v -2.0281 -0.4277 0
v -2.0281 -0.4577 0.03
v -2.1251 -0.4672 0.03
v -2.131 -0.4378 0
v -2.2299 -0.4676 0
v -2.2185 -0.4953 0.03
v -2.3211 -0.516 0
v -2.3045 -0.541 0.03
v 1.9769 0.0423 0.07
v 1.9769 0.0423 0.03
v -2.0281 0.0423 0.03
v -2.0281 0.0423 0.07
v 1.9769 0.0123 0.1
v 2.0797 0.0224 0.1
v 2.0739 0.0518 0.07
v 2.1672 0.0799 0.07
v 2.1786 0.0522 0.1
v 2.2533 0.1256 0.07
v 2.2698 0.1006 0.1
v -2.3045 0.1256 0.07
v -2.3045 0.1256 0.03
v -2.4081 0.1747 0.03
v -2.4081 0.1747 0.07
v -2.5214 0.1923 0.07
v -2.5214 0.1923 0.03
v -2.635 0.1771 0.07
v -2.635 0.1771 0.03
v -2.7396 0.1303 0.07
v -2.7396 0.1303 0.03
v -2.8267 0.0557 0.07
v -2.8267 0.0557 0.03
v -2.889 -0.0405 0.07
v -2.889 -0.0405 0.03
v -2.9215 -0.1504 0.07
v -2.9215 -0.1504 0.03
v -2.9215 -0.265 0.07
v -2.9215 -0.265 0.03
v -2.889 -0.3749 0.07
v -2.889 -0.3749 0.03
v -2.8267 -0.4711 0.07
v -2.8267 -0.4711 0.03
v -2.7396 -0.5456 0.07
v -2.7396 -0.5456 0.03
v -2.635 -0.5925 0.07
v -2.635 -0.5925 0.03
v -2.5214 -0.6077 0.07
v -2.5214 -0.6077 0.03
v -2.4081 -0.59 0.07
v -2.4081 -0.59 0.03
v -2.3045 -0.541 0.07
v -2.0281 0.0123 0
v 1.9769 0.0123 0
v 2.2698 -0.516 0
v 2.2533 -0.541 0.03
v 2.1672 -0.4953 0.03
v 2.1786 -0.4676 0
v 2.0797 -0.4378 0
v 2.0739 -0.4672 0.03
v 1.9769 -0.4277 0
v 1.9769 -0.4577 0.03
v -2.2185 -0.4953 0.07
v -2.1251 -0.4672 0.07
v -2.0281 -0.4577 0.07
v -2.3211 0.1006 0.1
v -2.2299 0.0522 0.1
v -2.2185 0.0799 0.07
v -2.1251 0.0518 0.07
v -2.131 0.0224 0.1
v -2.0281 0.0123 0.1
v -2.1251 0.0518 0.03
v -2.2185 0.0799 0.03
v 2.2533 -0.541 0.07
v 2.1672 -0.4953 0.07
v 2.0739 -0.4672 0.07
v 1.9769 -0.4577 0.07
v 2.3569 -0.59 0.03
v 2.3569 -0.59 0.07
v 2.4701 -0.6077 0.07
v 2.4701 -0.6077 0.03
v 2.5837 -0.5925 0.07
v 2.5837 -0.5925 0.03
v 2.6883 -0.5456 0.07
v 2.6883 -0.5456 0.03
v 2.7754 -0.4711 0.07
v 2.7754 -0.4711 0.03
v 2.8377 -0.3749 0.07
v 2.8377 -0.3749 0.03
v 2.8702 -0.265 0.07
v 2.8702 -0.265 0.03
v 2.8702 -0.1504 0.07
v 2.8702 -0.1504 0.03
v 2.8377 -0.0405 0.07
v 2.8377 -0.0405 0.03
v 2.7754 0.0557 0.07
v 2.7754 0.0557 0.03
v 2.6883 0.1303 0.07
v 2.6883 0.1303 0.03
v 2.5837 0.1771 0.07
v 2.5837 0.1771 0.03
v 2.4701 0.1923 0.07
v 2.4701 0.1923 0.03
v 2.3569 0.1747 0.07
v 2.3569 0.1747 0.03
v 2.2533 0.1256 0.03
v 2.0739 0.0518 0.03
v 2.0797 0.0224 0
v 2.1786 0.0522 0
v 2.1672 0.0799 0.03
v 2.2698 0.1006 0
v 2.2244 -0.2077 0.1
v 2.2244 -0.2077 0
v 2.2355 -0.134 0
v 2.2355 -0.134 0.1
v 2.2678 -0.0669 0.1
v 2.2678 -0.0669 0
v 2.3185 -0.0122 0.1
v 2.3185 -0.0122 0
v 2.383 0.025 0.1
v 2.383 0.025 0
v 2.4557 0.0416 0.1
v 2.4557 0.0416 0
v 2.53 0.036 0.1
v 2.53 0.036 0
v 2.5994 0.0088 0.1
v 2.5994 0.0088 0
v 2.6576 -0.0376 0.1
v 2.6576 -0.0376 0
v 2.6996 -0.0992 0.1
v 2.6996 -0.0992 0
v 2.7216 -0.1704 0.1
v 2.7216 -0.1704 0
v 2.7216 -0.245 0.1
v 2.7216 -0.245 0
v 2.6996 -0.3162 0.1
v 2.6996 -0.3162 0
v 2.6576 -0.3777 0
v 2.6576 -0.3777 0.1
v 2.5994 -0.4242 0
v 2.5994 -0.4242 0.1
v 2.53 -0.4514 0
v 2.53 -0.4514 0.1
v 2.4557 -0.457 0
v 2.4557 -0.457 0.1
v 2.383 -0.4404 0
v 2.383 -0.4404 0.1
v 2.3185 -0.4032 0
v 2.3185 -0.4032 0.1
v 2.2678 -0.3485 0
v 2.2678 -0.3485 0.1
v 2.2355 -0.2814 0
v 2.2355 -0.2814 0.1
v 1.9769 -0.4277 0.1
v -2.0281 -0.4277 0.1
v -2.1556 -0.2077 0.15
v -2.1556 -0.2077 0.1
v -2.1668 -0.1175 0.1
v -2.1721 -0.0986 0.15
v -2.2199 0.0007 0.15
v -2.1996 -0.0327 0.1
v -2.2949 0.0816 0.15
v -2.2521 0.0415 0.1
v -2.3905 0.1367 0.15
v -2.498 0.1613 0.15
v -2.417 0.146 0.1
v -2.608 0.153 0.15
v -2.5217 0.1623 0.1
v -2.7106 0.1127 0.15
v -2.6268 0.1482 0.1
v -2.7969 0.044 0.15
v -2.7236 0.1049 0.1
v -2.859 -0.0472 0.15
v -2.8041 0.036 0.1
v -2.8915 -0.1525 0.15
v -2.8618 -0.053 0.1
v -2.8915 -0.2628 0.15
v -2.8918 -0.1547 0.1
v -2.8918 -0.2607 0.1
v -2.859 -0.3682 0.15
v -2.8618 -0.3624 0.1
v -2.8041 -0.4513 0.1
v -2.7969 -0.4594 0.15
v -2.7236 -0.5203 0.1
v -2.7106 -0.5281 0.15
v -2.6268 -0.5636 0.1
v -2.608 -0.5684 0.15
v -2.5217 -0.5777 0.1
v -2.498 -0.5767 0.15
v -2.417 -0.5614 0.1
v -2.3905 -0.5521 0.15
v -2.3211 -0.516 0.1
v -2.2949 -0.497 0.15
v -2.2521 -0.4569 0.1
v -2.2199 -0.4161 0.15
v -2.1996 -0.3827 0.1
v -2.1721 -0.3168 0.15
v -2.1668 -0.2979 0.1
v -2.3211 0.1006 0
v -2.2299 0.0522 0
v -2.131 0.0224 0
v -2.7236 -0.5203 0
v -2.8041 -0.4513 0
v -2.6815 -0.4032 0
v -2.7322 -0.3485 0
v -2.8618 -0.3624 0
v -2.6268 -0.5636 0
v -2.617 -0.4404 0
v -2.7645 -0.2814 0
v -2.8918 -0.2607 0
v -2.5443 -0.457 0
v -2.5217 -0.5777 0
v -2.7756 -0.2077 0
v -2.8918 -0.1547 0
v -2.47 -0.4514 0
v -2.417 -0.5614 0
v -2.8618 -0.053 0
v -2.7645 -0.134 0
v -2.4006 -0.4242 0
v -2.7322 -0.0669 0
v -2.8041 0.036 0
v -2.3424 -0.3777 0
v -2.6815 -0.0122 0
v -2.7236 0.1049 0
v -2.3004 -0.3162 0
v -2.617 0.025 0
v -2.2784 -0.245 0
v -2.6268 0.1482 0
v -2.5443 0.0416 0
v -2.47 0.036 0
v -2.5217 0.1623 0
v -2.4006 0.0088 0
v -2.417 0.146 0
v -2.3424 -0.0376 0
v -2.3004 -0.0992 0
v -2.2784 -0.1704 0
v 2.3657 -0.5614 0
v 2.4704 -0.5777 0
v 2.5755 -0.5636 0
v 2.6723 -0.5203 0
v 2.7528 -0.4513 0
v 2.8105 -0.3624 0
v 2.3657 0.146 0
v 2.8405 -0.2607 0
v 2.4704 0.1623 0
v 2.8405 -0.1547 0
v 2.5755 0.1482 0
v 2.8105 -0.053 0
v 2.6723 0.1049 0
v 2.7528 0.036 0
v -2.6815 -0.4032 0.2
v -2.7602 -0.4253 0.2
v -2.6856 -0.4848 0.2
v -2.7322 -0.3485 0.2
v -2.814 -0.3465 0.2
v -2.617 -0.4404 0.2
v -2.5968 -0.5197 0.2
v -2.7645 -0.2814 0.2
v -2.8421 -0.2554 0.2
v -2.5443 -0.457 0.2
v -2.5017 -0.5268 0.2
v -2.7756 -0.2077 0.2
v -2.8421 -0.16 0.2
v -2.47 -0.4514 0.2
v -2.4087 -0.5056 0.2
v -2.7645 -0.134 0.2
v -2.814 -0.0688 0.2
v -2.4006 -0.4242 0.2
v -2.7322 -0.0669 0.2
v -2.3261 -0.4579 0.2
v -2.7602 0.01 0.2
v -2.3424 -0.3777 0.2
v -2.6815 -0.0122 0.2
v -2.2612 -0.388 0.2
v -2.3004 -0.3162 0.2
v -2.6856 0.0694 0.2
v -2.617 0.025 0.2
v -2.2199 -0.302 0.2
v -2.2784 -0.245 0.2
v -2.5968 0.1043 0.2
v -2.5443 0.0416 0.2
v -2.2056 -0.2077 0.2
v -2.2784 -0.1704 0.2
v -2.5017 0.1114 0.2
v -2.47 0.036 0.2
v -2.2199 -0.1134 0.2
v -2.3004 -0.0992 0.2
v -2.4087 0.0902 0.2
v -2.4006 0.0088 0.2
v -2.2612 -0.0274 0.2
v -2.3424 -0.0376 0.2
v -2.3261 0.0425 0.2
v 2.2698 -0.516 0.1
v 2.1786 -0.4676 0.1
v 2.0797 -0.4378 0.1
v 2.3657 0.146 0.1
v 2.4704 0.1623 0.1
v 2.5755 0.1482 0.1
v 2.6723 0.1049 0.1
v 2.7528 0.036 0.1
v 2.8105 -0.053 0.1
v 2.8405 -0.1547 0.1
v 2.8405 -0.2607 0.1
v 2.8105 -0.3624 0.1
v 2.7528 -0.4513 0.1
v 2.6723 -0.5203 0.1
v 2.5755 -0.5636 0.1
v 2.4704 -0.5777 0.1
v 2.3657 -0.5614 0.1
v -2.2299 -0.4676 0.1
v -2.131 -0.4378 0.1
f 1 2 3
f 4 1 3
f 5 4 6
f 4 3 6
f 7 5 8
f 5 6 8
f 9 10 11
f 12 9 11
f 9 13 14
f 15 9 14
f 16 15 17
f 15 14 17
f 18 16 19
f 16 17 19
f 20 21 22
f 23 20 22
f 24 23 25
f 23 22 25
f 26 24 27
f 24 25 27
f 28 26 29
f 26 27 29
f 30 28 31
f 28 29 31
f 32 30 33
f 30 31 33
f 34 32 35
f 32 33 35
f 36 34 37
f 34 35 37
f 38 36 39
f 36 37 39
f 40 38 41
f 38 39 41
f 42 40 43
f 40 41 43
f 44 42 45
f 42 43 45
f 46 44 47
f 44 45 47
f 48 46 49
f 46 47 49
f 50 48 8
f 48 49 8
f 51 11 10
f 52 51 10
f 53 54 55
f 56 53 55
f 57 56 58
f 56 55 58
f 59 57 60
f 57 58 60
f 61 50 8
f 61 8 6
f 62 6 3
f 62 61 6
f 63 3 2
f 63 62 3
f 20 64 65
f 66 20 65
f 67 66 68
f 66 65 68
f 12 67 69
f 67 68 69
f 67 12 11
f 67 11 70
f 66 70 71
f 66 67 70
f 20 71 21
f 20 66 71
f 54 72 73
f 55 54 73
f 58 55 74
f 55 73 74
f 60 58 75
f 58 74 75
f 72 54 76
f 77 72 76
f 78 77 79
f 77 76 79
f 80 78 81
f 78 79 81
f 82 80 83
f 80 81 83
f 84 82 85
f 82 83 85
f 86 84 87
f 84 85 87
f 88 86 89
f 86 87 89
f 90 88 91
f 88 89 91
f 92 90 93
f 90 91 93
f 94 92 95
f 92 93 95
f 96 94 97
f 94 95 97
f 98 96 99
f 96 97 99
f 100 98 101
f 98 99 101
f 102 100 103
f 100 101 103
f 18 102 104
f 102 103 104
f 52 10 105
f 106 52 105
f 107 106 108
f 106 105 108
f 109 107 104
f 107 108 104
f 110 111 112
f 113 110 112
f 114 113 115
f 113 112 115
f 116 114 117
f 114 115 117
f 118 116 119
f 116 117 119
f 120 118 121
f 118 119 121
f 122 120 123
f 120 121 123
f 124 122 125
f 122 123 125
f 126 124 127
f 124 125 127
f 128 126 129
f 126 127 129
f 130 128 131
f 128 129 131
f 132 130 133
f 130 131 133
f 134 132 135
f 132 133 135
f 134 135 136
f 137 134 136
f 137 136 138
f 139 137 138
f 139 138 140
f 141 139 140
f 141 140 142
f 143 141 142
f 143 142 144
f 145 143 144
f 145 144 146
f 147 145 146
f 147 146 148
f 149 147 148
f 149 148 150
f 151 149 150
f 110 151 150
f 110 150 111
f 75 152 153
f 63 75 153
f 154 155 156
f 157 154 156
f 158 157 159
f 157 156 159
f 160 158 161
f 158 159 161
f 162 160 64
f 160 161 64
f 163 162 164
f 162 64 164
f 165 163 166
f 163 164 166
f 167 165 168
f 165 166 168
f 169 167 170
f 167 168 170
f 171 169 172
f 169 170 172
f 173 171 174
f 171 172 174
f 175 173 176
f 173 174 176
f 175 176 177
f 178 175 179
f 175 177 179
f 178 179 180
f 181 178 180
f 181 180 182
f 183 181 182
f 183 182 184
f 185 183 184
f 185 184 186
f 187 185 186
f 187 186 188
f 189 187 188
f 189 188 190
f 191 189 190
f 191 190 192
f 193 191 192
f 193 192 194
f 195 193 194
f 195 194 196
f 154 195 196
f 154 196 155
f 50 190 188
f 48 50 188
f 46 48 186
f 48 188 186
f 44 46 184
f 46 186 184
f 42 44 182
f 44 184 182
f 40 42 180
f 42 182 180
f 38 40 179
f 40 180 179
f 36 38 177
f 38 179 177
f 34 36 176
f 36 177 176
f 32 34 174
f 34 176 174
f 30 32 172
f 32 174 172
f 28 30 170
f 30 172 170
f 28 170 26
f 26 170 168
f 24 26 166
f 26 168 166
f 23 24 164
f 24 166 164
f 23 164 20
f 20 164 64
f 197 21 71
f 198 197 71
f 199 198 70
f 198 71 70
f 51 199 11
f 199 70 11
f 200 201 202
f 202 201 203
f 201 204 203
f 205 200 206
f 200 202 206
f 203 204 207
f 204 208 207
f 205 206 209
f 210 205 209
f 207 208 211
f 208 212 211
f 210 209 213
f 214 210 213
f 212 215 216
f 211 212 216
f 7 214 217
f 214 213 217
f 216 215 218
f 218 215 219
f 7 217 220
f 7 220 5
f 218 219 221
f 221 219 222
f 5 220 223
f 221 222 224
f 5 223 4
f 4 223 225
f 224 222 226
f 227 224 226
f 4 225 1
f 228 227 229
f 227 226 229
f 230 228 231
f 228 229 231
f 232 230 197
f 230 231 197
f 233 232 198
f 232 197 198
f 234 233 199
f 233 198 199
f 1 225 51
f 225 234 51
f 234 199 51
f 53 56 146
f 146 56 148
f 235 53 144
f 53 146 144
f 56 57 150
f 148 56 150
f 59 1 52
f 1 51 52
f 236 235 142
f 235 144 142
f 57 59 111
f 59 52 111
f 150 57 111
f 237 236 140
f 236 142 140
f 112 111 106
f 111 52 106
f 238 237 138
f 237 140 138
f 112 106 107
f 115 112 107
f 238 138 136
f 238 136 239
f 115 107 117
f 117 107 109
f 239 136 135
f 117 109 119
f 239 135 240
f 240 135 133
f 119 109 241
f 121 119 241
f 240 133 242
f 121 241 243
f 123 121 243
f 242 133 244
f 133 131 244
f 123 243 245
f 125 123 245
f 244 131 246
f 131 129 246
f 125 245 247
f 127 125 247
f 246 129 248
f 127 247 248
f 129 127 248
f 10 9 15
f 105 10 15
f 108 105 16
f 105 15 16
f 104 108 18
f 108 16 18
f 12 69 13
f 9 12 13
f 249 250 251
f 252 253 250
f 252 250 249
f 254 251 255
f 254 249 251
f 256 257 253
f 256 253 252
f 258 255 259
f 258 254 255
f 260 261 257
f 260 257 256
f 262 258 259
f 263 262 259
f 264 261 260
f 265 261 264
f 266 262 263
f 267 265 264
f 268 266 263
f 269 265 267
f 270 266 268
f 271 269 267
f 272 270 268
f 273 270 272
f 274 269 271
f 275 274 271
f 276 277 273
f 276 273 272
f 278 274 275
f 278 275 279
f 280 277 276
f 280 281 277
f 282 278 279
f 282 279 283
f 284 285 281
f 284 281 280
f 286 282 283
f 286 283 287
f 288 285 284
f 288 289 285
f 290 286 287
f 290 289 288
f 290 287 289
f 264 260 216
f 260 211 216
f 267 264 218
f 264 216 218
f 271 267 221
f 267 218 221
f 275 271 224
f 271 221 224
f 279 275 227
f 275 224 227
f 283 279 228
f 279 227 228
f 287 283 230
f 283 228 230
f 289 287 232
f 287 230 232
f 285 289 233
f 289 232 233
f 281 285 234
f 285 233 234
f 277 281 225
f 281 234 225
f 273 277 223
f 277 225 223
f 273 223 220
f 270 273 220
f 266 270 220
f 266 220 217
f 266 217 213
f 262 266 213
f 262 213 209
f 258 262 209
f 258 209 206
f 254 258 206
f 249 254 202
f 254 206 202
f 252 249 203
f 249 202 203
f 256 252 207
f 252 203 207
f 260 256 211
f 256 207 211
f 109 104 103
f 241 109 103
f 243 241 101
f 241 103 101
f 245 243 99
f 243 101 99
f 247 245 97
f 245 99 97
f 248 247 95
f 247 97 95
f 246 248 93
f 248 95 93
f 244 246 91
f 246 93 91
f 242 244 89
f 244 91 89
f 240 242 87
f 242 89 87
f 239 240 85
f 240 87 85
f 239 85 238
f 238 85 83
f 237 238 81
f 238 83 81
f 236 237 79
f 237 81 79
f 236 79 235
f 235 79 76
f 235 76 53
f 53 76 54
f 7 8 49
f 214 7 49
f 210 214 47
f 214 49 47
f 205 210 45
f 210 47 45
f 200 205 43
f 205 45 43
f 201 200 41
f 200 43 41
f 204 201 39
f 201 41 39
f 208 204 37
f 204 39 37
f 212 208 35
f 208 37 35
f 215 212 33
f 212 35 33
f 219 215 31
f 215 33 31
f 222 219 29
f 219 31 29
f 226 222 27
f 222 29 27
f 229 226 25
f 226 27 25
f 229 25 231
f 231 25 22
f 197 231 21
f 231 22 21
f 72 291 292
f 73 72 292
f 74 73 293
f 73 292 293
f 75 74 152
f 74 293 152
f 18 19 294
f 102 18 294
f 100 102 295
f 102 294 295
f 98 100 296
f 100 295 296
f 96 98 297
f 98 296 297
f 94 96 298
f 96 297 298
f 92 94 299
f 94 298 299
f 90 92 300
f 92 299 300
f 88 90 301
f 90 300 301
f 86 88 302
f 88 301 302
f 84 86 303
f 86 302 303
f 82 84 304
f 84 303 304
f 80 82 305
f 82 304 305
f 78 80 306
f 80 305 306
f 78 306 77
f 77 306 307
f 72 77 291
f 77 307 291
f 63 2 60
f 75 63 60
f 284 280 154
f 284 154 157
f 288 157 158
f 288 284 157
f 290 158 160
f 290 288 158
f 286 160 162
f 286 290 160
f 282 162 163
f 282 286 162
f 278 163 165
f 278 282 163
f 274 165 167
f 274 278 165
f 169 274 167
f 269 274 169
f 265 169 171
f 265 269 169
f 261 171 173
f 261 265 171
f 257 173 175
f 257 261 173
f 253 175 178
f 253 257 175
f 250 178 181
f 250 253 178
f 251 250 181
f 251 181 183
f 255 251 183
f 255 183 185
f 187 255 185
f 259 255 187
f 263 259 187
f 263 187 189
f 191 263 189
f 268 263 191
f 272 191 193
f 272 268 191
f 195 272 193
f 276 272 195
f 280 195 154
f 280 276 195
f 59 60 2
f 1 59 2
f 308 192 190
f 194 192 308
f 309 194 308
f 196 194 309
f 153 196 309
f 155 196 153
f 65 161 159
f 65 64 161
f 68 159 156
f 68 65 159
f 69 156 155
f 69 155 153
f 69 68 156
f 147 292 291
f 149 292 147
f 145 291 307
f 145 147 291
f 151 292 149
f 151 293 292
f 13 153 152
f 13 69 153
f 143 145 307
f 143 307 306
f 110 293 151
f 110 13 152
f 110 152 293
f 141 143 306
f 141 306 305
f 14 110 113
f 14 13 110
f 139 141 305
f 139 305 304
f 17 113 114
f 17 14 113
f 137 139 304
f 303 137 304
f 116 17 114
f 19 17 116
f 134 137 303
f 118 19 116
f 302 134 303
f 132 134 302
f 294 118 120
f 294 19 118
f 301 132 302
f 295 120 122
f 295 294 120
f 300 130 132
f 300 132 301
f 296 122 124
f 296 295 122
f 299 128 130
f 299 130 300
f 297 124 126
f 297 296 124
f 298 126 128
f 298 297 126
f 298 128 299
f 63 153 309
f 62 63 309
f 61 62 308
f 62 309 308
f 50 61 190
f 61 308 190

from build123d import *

# Parameters (mm, degrees)
BOSS_EXTRUDE1_DEPTH     = 0.1
FILLET1_R               = 0.5
FILLET2_R               = 0.5
CHAMFER2_SIZE           = 0.03
CHAMFER3_SIZE           = 0.03
SKETCH3_R               = 0.25
CUT_EXTRUDE1_DEPTH      = 1
CUT_EXTRUDE1_DEPTH_BACK = 1.1
SKETCH5_R               = 0.37
BOSS_EXTRUDE2_DEPTH     = 0.1
SKETCH7_R               = 0.25
CUT_EXTRUDE2_DEPTH      = 0.1
CHAMFER4_SIZE           = 0.05


with BuildPart() as part:
    # Sketch2 → Boss-Extrude1 (new body)
    with BuildSketch(Plane.XY):
        with BuildLine():
            Line((2.162109074, 0.042307692), (-2.213391126, 0.042307692))
            ThreePointArc((-2.213391126, 0.042307692), (-2.925641026, -0.207692308), (-2.213391126, -0.457692308))
            Line((-2.213391126, -0.457692308), (2.162109074, -0.457692308))
            ThreePointArc((2.162109074, -0.457692308), (2.874358974, -0.207692308), (2.162109074, 0.042307692))
        make_face()
    extrude(amount=BOSS_EXTRUDE1_DEPTH)

    # Fillet1
    fillet1_edges = [part.edges().sort_by_distance(p)[0] for p in [
        (2.162109074, 0.042307692, 0.05),
    ]]
    fillet(fillet1_edges, radius=FILLET1_R)

    # Fillet2
    fillet2_edges = [part.edges().sort_by_distance(p)[0] for p in [
        (2.162109074, -0.457692308, 0.05),
        (-2.213391126, -0.457692308, 0.05),
        (-2.213391126, 0.042307692, 0.05),
    ]]
    fillet(fillet2_edges, radius=FILLET2_R)

    # Chamfer2
    chamfer2_edges = [part.edges().sort_by_distance(p)[0] for p in [
        (2.121202823, 0.063594138, 0.1),
        (-2.925641026, -0.207692308, 0.1),
        (-0.025641026, 0.042307692, 0.1),
        (-0.025641026, -0.457692308, 0.1),
        (2.874358974, -0.207692308, 0.1),
        (-2.172484874, 0.063594138, 0.1),
        (-2.172484874, -0.478978754, 0.1),
        (2.121202823, -0.478978754, 0.1),
    ]]
    chamfer(chamfer2_edges, length=CHAMFER2_SIZE)

    # Chamfer3
    chamfer3_edges = [part.edges().sort_by_distance(p)[0] for p in [
        (2.121202823, 0.063594138, 0),
        (-2.925641026, -0.207692308, 0),
        (-0.025641026, 0.042307692, 0),
        (-0.025641026, -0.457692308, 0),
        (2.874358974, -0.207692308, 0),
        (-2.172484874, 0.063594138, 0),
        (-2.172484874, -0.478978754, 0),
        (2.121202823, -0.478978754, 0),
    ]]
    chamfer(chamfer3_edges, length=CHAMFER3_SIZE)

    # Sketch3 → Cut-Extrude1 (cut, two sides)
    with BuildSketch(Plane(origin=(0, 0, 0), x_dir=(-1, 0, 0), z_dir=(0, 0, -1))) as cut_extrude1_sk:
        with Locations((-2.474358974, -0.207692308)):
            Circle(SKETCH3_R)
        with Locations((2.525641026, -0.207692308)):
            Circle(SKETCH3_R)
    extrude(amount=CUT_EXTRUDE1_DEPTH, mode=Mode.SUBTRACT)
    extrude(cut_extrude1_sk.sketch, amount=-CUT_EXTRUDE1_DEPTH_BACK, mode=Mode.SUBTRACT)

    # Sketch5 → Boss-Extrude2 (add)
    with BuildSketch(Plane.XY.offset(0.1)):
        with Locations((-2.525641026, -0.207692308)):
            Circle(SKETCH5_R)
    extrude(amount=BOSS_EXTRUDE2_DEPTH)

    # Sketch7 → Cut-Extrude2 (cut)
    with BuildSketch(Plane(origin=(0, 0, 0.1), x_dir=(-1, 0, 0), z_dir=(0, 0, -1))):
        with Locations((2.525641026, -0.207692308)):
            Circle(SKETCH7_R)
    extrude(amount=-CUT_EXTRUDE2_DEPTH, mode=Mode.SUBTRACT)

    # Chamfer4
    chamfer4_edges = [part.edges().sort_by_distance(p)[0] for p in [
        (-2.895641026, -0.207692308, 0.2),
    ]]
    chamfer(chamfer4_edges, length=CHAMFER4_SIZE)


solid = part.part
